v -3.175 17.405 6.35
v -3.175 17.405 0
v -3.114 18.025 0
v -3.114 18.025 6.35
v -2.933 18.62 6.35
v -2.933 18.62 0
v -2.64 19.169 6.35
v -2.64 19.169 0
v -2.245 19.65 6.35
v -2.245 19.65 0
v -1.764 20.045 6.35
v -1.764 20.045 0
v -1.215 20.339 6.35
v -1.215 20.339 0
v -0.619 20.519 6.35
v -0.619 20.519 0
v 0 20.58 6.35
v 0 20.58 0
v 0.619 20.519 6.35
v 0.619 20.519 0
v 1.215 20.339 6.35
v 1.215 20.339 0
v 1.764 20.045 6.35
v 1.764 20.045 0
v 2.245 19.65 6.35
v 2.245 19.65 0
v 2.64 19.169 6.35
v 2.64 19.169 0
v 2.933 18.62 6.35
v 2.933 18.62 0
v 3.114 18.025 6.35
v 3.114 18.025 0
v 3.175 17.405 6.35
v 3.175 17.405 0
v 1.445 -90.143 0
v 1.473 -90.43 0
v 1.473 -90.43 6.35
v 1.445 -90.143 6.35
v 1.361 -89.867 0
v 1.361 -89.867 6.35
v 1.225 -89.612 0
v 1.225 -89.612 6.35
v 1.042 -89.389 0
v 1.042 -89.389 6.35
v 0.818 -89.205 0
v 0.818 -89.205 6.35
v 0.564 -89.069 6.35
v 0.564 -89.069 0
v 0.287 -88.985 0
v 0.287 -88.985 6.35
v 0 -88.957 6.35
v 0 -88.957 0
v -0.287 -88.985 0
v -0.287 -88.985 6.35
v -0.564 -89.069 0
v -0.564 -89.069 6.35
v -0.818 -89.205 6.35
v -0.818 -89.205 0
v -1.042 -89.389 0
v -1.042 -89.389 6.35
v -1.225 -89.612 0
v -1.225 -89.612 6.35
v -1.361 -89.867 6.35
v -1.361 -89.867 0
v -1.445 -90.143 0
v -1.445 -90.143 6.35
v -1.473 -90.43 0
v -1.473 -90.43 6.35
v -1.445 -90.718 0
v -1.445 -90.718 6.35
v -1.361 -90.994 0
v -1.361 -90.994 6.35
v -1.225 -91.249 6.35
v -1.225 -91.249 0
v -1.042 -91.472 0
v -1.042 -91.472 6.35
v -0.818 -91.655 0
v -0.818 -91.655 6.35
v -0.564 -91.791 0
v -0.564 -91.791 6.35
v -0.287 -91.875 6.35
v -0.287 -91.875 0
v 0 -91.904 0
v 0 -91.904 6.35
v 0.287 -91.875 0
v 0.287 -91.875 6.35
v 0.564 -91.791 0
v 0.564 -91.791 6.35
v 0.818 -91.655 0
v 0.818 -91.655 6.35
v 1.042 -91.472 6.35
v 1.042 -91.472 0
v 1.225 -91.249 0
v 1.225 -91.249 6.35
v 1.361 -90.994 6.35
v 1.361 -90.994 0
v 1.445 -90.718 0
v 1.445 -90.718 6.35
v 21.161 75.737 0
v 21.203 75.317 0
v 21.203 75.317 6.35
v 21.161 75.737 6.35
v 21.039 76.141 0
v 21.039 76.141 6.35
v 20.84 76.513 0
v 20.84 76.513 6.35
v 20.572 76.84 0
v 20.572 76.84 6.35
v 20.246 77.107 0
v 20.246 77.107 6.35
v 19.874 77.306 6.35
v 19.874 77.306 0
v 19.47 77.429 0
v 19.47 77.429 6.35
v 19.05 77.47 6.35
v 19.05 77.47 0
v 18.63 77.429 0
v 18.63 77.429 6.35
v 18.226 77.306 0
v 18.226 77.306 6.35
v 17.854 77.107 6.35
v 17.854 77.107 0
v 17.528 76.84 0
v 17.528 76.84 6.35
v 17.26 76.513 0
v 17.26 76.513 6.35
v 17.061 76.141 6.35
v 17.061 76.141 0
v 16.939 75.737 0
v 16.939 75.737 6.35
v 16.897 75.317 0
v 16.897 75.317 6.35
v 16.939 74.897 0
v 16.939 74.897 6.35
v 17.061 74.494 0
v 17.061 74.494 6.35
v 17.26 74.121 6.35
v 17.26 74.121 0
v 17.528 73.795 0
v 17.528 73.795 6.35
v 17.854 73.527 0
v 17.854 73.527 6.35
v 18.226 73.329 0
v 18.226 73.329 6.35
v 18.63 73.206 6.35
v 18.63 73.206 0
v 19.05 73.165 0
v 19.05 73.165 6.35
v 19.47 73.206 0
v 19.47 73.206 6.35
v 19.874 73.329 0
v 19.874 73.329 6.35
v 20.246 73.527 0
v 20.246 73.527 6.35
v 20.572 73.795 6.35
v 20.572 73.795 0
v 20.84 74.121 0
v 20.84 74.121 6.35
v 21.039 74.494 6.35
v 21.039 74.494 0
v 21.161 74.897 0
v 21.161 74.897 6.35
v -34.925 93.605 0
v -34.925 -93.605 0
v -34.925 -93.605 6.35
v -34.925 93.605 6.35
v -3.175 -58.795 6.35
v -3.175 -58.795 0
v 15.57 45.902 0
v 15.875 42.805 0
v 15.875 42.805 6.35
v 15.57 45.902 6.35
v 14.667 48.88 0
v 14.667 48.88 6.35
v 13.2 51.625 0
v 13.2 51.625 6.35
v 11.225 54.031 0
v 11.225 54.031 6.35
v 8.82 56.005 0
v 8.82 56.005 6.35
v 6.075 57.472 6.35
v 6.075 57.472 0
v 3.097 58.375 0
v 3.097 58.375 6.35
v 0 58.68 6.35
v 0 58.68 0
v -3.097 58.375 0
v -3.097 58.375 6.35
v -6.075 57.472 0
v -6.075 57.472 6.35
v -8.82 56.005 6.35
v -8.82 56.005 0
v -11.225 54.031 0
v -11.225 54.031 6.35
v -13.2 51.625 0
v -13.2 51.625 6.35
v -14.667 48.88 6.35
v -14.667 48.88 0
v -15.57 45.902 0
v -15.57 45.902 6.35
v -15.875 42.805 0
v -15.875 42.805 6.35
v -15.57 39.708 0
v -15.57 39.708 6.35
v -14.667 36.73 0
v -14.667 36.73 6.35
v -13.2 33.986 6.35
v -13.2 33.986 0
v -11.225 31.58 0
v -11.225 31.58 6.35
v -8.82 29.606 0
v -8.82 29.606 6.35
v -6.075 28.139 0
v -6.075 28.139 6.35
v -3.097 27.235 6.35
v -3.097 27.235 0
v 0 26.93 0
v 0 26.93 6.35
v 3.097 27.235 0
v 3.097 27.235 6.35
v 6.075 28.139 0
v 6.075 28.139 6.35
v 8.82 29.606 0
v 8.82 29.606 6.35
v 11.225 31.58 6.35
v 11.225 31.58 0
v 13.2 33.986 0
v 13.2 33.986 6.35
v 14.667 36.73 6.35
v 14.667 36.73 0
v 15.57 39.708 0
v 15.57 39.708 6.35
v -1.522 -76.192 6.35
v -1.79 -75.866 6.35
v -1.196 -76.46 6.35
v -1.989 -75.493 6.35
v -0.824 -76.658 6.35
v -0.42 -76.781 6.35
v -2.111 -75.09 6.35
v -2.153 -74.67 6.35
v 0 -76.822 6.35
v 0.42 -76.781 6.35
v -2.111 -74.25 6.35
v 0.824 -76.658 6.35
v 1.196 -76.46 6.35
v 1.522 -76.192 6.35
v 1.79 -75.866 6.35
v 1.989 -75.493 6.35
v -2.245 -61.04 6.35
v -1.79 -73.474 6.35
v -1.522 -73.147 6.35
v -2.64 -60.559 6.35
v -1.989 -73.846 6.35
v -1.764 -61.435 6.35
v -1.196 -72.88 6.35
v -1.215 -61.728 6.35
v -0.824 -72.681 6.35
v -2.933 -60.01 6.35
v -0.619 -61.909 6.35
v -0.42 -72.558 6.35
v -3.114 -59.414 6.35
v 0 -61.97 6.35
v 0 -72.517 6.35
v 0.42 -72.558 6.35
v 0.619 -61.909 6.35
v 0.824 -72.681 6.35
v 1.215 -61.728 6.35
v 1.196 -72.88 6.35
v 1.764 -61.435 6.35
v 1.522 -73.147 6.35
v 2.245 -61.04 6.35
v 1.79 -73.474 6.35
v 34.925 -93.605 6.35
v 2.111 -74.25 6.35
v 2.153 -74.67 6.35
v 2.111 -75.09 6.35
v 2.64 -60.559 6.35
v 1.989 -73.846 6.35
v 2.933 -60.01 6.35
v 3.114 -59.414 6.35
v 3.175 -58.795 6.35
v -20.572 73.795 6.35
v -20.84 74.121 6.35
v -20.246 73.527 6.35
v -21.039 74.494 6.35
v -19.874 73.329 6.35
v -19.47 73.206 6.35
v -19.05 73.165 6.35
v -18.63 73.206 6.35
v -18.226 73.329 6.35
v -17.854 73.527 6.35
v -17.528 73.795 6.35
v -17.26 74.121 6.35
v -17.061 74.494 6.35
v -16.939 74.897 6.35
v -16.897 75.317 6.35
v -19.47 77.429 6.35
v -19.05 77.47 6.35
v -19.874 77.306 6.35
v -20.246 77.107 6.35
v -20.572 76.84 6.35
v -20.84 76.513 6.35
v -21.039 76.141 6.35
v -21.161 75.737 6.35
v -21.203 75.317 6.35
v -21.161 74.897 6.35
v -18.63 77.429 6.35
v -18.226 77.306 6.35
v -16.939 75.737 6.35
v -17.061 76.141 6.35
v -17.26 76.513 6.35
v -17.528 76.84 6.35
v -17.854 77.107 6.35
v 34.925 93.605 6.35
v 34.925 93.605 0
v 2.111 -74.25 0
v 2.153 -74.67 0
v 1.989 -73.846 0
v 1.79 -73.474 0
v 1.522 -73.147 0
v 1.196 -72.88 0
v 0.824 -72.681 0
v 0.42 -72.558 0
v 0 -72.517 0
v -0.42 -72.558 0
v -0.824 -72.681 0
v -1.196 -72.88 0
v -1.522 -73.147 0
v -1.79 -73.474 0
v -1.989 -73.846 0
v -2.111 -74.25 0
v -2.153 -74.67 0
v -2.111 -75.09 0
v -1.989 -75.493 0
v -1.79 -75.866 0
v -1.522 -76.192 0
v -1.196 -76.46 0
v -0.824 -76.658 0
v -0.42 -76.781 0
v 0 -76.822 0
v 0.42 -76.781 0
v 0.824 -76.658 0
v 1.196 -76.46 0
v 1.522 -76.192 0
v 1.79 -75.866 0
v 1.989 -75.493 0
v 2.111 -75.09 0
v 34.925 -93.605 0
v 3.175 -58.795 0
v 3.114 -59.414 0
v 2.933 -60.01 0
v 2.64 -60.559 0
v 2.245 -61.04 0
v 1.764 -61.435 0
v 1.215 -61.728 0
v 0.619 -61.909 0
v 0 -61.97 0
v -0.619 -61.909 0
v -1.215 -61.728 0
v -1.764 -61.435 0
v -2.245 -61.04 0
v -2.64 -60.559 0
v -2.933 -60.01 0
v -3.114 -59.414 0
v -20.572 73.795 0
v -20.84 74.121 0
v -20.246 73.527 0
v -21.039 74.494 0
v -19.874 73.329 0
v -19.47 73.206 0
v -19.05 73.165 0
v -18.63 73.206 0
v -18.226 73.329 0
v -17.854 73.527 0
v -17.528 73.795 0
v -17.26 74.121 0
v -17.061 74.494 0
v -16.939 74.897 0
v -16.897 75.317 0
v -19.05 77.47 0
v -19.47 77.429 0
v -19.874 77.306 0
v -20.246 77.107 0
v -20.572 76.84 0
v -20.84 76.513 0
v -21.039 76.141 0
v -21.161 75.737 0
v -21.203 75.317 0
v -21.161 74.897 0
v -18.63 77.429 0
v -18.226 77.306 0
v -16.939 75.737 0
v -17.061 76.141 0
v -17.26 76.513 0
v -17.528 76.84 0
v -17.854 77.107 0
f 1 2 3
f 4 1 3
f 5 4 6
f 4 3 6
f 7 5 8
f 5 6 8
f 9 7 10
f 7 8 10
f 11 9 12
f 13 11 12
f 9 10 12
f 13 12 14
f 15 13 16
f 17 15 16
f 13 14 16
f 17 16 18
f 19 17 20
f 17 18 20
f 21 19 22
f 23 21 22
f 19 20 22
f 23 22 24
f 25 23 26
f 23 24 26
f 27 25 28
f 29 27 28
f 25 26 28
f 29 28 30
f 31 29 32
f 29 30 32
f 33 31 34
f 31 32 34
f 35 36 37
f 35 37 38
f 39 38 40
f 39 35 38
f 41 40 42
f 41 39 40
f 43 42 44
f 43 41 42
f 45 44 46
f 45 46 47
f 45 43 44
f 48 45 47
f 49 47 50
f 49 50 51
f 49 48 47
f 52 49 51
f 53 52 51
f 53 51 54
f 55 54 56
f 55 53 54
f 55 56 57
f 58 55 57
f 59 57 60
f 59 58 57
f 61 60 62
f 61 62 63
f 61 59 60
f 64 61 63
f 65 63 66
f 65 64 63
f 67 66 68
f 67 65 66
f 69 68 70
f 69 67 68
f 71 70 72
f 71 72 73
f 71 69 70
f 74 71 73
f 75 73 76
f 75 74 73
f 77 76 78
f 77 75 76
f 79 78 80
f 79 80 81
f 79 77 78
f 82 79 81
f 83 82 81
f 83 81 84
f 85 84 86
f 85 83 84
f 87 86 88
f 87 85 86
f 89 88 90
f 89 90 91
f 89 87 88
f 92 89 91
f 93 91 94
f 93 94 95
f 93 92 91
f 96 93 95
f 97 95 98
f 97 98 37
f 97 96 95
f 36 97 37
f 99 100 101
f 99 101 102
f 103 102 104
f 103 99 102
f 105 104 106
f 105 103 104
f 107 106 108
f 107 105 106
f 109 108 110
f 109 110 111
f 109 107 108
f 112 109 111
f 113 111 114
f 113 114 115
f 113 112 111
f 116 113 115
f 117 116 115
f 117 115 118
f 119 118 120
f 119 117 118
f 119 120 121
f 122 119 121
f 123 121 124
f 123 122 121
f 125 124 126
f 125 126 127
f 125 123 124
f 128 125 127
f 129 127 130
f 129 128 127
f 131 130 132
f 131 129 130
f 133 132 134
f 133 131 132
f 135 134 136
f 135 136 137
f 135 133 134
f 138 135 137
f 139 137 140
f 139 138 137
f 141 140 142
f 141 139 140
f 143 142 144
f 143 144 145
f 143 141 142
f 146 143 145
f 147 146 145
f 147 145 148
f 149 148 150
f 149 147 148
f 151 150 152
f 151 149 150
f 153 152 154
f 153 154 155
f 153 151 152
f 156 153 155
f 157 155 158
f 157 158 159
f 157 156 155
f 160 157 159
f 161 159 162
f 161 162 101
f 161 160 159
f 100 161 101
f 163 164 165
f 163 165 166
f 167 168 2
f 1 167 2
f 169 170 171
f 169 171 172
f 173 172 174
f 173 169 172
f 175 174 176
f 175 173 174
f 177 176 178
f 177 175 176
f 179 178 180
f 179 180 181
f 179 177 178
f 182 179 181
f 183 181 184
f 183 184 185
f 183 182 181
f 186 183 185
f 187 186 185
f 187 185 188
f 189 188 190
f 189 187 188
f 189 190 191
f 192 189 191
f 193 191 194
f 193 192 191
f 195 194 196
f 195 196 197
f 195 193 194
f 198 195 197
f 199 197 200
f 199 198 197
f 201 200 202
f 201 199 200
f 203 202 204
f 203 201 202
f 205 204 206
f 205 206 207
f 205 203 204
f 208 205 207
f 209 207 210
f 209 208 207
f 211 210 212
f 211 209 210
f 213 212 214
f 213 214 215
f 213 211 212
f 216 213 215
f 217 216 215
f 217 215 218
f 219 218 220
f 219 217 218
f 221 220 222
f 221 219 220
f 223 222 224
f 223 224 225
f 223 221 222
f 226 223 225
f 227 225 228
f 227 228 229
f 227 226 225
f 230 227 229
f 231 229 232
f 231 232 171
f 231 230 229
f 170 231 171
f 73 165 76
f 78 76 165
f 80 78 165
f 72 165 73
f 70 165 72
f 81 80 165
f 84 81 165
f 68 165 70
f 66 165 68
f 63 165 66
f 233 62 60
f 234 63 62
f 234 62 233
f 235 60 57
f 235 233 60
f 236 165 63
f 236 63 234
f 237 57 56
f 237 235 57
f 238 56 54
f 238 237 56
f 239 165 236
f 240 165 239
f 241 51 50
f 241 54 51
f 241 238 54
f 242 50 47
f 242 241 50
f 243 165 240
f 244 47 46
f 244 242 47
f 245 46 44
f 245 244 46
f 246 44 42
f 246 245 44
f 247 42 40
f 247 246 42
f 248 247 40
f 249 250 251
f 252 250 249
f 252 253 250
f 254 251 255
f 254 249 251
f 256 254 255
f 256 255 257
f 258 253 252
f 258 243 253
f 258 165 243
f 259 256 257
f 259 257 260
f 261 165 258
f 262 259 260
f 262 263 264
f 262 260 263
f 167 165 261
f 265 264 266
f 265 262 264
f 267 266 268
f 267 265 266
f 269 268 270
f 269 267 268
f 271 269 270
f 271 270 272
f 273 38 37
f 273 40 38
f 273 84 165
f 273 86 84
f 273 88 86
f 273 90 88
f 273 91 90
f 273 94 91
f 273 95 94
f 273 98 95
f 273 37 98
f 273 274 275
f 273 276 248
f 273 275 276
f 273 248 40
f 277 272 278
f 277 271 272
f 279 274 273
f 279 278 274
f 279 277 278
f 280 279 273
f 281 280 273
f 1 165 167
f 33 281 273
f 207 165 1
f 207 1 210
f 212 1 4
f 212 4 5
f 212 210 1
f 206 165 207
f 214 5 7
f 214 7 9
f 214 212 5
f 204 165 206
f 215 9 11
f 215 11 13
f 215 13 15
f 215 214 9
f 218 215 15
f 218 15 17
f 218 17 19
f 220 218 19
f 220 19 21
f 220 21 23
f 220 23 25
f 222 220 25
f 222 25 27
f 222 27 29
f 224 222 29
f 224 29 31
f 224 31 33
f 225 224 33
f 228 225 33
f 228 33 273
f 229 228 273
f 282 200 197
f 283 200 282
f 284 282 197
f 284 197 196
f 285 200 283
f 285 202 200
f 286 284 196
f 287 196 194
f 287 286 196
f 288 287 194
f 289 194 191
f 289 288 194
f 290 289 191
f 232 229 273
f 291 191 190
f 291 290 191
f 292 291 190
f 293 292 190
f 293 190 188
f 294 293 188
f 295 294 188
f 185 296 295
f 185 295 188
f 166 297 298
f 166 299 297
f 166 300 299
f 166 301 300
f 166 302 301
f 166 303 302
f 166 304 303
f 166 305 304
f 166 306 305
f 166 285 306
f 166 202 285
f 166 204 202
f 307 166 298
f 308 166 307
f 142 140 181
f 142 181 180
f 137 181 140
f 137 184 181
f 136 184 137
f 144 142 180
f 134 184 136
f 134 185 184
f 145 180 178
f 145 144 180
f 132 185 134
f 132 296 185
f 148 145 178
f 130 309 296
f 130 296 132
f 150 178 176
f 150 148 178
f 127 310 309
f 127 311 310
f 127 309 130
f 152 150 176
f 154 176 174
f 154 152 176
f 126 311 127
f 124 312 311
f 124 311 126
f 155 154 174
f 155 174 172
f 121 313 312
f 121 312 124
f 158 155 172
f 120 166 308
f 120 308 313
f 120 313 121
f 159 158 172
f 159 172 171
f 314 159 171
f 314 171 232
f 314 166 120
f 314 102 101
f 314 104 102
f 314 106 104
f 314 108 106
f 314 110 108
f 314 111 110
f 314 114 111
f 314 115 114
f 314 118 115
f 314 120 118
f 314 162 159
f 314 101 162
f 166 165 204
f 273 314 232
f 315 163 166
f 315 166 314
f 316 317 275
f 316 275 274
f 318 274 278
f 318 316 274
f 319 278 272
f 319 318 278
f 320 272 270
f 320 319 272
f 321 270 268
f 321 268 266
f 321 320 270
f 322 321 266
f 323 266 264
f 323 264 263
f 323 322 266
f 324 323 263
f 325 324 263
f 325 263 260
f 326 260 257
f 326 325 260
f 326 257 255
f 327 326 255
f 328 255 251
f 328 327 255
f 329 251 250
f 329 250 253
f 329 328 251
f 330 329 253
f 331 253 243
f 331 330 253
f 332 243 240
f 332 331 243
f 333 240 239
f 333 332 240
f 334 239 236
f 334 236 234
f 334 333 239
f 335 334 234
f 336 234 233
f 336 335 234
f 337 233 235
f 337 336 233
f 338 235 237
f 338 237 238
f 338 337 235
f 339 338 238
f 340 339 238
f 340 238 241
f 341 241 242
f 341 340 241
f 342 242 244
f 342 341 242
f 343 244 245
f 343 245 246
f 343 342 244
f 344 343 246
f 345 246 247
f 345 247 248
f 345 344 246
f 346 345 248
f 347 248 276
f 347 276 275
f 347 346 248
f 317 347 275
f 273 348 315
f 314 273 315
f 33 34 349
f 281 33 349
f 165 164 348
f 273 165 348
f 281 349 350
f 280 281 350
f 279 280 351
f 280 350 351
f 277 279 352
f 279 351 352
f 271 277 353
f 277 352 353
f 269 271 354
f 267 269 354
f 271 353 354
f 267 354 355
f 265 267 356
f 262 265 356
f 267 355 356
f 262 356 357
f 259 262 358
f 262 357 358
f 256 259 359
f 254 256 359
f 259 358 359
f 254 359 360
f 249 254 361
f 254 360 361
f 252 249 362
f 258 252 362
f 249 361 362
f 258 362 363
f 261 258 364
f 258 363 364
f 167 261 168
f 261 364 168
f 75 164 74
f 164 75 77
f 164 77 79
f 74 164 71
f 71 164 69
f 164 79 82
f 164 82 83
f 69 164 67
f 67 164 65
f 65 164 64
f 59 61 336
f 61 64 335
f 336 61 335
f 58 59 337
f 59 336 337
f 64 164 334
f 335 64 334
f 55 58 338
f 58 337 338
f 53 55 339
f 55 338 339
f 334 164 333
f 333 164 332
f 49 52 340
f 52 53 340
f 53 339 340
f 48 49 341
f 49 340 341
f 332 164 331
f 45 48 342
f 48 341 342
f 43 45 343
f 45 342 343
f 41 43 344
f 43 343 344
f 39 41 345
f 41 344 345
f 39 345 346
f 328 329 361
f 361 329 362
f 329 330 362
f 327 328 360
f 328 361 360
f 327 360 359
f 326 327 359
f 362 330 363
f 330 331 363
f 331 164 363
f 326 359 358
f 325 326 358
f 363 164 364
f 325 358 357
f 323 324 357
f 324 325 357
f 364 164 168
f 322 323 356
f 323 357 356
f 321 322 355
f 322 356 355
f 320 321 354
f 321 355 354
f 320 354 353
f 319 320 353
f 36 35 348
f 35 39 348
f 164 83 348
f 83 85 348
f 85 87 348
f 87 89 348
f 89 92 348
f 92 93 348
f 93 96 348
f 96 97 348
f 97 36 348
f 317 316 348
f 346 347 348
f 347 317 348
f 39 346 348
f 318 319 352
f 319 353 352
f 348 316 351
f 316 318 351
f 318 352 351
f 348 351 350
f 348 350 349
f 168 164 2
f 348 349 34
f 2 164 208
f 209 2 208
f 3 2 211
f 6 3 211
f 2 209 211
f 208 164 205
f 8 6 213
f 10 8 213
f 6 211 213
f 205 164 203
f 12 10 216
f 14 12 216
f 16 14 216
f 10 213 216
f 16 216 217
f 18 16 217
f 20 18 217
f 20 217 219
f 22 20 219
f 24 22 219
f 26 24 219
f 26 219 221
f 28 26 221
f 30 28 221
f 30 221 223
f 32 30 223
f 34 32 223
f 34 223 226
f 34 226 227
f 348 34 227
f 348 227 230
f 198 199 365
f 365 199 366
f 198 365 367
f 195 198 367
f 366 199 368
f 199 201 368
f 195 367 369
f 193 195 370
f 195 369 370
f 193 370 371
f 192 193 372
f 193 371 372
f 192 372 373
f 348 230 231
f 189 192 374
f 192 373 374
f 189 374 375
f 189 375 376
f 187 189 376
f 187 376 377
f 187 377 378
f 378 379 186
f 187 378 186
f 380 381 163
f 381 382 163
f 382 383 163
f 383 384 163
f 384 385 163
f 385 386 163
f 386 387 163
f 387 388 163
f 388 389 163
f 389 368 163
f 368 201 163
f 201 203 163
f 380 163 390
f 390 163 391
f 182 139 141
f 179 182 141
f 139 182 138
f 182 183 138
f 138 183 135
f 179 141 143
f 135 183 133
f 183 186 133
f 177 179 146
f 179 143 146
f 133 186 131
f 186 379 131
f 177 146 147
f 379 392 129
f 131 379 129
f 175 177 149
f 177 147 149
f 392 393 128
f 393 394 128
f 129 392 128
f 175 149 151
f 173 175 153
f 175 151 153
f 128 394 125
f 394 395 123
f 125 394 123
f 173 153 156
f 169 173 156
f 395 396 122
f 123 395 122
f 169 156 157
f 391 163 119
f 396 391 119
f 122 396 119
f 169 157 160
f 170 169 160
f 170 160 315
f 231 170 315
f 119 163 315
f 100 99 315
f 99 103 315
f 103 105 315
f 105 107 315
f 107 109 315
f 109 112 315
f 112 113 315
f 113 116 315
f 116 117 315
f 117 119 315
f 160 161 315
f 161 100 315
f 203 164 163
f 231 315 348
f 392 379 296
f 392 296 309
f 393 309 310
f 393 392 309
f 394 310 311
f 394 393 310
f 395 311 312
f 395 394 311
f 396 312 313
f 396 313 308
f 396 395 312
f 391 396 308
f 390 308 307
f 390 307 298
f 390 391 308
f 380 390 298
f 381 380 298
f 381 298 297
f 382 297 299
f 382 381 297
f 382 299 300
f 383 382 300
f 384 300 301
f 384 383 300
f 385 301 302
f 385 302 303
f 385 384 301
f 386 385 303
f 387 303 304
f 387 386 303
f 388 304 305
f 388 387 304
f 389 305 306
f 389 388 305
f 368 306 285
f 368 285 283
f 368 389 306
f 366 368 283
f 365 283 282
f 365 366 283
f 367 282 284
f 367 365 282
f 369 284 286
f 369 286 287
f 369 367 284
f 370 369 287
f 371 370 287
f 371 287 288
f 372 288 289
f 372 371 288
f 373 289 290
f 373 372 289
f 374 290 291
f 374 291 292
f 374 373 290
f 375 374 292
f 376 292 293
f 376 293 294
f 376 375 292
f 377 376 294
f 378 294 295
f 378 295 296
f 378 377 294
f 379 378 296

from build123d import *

# Parameters (mm, degrees)
F1_W     = 69.85
F1_H     = 187.2107
F1_R     = 1.4732
F1_R_2   = 2.15265
F1_R_3   = 15.875
F2_DEPTH = 6.35


# Not quite as in the source:
# - a variable given as a bare number and used for a length is read in inches; the dataset says mm whatever the document's units were


with BuildPart() as f2:
    # F1 (on Top) → F2 (new body)
    with BuildSketch(Plane.XY):
        Rectangle(F1_W, F1_H)
        with Locations((0, -90.43035)):
            Circle(F1_R, mode=Mode.SUBTRACT)
        with Locations((0, -74.66965)):
            Circle(F1_R_2, mode=Mode.SUBTRACT)
        with BuildLine():
            ThreePointArc((-3.175, 17.40535), (0, 20.58035), (3.175, 17.40535))
            Line((3.175, 17.40535), (3.175, -58.79465))
            ThreePointArc((3.175, -58.79465), (0, -61.96965), (-3.175, -58.79465))
            Line((-3.175, -58.79465), (-3.175, 17.40535))
        make_face(mode=Mode.SUBTRACT)
        with Locations((-19.05, 75.31735)):
            Circle(F1_R_2, mode=Mode.SUBTRACT)
        with Locations((0, 42.80535)):
            Circle(F1_R_3, mode=Mode.SUBTRACT)
        with Locations((19.05, 75.31735)):
            Circle(F1_R_2, mode=Mode.SUBTRACT)
    extrude(amount=F2_DEPTH)


solid = f2.part
